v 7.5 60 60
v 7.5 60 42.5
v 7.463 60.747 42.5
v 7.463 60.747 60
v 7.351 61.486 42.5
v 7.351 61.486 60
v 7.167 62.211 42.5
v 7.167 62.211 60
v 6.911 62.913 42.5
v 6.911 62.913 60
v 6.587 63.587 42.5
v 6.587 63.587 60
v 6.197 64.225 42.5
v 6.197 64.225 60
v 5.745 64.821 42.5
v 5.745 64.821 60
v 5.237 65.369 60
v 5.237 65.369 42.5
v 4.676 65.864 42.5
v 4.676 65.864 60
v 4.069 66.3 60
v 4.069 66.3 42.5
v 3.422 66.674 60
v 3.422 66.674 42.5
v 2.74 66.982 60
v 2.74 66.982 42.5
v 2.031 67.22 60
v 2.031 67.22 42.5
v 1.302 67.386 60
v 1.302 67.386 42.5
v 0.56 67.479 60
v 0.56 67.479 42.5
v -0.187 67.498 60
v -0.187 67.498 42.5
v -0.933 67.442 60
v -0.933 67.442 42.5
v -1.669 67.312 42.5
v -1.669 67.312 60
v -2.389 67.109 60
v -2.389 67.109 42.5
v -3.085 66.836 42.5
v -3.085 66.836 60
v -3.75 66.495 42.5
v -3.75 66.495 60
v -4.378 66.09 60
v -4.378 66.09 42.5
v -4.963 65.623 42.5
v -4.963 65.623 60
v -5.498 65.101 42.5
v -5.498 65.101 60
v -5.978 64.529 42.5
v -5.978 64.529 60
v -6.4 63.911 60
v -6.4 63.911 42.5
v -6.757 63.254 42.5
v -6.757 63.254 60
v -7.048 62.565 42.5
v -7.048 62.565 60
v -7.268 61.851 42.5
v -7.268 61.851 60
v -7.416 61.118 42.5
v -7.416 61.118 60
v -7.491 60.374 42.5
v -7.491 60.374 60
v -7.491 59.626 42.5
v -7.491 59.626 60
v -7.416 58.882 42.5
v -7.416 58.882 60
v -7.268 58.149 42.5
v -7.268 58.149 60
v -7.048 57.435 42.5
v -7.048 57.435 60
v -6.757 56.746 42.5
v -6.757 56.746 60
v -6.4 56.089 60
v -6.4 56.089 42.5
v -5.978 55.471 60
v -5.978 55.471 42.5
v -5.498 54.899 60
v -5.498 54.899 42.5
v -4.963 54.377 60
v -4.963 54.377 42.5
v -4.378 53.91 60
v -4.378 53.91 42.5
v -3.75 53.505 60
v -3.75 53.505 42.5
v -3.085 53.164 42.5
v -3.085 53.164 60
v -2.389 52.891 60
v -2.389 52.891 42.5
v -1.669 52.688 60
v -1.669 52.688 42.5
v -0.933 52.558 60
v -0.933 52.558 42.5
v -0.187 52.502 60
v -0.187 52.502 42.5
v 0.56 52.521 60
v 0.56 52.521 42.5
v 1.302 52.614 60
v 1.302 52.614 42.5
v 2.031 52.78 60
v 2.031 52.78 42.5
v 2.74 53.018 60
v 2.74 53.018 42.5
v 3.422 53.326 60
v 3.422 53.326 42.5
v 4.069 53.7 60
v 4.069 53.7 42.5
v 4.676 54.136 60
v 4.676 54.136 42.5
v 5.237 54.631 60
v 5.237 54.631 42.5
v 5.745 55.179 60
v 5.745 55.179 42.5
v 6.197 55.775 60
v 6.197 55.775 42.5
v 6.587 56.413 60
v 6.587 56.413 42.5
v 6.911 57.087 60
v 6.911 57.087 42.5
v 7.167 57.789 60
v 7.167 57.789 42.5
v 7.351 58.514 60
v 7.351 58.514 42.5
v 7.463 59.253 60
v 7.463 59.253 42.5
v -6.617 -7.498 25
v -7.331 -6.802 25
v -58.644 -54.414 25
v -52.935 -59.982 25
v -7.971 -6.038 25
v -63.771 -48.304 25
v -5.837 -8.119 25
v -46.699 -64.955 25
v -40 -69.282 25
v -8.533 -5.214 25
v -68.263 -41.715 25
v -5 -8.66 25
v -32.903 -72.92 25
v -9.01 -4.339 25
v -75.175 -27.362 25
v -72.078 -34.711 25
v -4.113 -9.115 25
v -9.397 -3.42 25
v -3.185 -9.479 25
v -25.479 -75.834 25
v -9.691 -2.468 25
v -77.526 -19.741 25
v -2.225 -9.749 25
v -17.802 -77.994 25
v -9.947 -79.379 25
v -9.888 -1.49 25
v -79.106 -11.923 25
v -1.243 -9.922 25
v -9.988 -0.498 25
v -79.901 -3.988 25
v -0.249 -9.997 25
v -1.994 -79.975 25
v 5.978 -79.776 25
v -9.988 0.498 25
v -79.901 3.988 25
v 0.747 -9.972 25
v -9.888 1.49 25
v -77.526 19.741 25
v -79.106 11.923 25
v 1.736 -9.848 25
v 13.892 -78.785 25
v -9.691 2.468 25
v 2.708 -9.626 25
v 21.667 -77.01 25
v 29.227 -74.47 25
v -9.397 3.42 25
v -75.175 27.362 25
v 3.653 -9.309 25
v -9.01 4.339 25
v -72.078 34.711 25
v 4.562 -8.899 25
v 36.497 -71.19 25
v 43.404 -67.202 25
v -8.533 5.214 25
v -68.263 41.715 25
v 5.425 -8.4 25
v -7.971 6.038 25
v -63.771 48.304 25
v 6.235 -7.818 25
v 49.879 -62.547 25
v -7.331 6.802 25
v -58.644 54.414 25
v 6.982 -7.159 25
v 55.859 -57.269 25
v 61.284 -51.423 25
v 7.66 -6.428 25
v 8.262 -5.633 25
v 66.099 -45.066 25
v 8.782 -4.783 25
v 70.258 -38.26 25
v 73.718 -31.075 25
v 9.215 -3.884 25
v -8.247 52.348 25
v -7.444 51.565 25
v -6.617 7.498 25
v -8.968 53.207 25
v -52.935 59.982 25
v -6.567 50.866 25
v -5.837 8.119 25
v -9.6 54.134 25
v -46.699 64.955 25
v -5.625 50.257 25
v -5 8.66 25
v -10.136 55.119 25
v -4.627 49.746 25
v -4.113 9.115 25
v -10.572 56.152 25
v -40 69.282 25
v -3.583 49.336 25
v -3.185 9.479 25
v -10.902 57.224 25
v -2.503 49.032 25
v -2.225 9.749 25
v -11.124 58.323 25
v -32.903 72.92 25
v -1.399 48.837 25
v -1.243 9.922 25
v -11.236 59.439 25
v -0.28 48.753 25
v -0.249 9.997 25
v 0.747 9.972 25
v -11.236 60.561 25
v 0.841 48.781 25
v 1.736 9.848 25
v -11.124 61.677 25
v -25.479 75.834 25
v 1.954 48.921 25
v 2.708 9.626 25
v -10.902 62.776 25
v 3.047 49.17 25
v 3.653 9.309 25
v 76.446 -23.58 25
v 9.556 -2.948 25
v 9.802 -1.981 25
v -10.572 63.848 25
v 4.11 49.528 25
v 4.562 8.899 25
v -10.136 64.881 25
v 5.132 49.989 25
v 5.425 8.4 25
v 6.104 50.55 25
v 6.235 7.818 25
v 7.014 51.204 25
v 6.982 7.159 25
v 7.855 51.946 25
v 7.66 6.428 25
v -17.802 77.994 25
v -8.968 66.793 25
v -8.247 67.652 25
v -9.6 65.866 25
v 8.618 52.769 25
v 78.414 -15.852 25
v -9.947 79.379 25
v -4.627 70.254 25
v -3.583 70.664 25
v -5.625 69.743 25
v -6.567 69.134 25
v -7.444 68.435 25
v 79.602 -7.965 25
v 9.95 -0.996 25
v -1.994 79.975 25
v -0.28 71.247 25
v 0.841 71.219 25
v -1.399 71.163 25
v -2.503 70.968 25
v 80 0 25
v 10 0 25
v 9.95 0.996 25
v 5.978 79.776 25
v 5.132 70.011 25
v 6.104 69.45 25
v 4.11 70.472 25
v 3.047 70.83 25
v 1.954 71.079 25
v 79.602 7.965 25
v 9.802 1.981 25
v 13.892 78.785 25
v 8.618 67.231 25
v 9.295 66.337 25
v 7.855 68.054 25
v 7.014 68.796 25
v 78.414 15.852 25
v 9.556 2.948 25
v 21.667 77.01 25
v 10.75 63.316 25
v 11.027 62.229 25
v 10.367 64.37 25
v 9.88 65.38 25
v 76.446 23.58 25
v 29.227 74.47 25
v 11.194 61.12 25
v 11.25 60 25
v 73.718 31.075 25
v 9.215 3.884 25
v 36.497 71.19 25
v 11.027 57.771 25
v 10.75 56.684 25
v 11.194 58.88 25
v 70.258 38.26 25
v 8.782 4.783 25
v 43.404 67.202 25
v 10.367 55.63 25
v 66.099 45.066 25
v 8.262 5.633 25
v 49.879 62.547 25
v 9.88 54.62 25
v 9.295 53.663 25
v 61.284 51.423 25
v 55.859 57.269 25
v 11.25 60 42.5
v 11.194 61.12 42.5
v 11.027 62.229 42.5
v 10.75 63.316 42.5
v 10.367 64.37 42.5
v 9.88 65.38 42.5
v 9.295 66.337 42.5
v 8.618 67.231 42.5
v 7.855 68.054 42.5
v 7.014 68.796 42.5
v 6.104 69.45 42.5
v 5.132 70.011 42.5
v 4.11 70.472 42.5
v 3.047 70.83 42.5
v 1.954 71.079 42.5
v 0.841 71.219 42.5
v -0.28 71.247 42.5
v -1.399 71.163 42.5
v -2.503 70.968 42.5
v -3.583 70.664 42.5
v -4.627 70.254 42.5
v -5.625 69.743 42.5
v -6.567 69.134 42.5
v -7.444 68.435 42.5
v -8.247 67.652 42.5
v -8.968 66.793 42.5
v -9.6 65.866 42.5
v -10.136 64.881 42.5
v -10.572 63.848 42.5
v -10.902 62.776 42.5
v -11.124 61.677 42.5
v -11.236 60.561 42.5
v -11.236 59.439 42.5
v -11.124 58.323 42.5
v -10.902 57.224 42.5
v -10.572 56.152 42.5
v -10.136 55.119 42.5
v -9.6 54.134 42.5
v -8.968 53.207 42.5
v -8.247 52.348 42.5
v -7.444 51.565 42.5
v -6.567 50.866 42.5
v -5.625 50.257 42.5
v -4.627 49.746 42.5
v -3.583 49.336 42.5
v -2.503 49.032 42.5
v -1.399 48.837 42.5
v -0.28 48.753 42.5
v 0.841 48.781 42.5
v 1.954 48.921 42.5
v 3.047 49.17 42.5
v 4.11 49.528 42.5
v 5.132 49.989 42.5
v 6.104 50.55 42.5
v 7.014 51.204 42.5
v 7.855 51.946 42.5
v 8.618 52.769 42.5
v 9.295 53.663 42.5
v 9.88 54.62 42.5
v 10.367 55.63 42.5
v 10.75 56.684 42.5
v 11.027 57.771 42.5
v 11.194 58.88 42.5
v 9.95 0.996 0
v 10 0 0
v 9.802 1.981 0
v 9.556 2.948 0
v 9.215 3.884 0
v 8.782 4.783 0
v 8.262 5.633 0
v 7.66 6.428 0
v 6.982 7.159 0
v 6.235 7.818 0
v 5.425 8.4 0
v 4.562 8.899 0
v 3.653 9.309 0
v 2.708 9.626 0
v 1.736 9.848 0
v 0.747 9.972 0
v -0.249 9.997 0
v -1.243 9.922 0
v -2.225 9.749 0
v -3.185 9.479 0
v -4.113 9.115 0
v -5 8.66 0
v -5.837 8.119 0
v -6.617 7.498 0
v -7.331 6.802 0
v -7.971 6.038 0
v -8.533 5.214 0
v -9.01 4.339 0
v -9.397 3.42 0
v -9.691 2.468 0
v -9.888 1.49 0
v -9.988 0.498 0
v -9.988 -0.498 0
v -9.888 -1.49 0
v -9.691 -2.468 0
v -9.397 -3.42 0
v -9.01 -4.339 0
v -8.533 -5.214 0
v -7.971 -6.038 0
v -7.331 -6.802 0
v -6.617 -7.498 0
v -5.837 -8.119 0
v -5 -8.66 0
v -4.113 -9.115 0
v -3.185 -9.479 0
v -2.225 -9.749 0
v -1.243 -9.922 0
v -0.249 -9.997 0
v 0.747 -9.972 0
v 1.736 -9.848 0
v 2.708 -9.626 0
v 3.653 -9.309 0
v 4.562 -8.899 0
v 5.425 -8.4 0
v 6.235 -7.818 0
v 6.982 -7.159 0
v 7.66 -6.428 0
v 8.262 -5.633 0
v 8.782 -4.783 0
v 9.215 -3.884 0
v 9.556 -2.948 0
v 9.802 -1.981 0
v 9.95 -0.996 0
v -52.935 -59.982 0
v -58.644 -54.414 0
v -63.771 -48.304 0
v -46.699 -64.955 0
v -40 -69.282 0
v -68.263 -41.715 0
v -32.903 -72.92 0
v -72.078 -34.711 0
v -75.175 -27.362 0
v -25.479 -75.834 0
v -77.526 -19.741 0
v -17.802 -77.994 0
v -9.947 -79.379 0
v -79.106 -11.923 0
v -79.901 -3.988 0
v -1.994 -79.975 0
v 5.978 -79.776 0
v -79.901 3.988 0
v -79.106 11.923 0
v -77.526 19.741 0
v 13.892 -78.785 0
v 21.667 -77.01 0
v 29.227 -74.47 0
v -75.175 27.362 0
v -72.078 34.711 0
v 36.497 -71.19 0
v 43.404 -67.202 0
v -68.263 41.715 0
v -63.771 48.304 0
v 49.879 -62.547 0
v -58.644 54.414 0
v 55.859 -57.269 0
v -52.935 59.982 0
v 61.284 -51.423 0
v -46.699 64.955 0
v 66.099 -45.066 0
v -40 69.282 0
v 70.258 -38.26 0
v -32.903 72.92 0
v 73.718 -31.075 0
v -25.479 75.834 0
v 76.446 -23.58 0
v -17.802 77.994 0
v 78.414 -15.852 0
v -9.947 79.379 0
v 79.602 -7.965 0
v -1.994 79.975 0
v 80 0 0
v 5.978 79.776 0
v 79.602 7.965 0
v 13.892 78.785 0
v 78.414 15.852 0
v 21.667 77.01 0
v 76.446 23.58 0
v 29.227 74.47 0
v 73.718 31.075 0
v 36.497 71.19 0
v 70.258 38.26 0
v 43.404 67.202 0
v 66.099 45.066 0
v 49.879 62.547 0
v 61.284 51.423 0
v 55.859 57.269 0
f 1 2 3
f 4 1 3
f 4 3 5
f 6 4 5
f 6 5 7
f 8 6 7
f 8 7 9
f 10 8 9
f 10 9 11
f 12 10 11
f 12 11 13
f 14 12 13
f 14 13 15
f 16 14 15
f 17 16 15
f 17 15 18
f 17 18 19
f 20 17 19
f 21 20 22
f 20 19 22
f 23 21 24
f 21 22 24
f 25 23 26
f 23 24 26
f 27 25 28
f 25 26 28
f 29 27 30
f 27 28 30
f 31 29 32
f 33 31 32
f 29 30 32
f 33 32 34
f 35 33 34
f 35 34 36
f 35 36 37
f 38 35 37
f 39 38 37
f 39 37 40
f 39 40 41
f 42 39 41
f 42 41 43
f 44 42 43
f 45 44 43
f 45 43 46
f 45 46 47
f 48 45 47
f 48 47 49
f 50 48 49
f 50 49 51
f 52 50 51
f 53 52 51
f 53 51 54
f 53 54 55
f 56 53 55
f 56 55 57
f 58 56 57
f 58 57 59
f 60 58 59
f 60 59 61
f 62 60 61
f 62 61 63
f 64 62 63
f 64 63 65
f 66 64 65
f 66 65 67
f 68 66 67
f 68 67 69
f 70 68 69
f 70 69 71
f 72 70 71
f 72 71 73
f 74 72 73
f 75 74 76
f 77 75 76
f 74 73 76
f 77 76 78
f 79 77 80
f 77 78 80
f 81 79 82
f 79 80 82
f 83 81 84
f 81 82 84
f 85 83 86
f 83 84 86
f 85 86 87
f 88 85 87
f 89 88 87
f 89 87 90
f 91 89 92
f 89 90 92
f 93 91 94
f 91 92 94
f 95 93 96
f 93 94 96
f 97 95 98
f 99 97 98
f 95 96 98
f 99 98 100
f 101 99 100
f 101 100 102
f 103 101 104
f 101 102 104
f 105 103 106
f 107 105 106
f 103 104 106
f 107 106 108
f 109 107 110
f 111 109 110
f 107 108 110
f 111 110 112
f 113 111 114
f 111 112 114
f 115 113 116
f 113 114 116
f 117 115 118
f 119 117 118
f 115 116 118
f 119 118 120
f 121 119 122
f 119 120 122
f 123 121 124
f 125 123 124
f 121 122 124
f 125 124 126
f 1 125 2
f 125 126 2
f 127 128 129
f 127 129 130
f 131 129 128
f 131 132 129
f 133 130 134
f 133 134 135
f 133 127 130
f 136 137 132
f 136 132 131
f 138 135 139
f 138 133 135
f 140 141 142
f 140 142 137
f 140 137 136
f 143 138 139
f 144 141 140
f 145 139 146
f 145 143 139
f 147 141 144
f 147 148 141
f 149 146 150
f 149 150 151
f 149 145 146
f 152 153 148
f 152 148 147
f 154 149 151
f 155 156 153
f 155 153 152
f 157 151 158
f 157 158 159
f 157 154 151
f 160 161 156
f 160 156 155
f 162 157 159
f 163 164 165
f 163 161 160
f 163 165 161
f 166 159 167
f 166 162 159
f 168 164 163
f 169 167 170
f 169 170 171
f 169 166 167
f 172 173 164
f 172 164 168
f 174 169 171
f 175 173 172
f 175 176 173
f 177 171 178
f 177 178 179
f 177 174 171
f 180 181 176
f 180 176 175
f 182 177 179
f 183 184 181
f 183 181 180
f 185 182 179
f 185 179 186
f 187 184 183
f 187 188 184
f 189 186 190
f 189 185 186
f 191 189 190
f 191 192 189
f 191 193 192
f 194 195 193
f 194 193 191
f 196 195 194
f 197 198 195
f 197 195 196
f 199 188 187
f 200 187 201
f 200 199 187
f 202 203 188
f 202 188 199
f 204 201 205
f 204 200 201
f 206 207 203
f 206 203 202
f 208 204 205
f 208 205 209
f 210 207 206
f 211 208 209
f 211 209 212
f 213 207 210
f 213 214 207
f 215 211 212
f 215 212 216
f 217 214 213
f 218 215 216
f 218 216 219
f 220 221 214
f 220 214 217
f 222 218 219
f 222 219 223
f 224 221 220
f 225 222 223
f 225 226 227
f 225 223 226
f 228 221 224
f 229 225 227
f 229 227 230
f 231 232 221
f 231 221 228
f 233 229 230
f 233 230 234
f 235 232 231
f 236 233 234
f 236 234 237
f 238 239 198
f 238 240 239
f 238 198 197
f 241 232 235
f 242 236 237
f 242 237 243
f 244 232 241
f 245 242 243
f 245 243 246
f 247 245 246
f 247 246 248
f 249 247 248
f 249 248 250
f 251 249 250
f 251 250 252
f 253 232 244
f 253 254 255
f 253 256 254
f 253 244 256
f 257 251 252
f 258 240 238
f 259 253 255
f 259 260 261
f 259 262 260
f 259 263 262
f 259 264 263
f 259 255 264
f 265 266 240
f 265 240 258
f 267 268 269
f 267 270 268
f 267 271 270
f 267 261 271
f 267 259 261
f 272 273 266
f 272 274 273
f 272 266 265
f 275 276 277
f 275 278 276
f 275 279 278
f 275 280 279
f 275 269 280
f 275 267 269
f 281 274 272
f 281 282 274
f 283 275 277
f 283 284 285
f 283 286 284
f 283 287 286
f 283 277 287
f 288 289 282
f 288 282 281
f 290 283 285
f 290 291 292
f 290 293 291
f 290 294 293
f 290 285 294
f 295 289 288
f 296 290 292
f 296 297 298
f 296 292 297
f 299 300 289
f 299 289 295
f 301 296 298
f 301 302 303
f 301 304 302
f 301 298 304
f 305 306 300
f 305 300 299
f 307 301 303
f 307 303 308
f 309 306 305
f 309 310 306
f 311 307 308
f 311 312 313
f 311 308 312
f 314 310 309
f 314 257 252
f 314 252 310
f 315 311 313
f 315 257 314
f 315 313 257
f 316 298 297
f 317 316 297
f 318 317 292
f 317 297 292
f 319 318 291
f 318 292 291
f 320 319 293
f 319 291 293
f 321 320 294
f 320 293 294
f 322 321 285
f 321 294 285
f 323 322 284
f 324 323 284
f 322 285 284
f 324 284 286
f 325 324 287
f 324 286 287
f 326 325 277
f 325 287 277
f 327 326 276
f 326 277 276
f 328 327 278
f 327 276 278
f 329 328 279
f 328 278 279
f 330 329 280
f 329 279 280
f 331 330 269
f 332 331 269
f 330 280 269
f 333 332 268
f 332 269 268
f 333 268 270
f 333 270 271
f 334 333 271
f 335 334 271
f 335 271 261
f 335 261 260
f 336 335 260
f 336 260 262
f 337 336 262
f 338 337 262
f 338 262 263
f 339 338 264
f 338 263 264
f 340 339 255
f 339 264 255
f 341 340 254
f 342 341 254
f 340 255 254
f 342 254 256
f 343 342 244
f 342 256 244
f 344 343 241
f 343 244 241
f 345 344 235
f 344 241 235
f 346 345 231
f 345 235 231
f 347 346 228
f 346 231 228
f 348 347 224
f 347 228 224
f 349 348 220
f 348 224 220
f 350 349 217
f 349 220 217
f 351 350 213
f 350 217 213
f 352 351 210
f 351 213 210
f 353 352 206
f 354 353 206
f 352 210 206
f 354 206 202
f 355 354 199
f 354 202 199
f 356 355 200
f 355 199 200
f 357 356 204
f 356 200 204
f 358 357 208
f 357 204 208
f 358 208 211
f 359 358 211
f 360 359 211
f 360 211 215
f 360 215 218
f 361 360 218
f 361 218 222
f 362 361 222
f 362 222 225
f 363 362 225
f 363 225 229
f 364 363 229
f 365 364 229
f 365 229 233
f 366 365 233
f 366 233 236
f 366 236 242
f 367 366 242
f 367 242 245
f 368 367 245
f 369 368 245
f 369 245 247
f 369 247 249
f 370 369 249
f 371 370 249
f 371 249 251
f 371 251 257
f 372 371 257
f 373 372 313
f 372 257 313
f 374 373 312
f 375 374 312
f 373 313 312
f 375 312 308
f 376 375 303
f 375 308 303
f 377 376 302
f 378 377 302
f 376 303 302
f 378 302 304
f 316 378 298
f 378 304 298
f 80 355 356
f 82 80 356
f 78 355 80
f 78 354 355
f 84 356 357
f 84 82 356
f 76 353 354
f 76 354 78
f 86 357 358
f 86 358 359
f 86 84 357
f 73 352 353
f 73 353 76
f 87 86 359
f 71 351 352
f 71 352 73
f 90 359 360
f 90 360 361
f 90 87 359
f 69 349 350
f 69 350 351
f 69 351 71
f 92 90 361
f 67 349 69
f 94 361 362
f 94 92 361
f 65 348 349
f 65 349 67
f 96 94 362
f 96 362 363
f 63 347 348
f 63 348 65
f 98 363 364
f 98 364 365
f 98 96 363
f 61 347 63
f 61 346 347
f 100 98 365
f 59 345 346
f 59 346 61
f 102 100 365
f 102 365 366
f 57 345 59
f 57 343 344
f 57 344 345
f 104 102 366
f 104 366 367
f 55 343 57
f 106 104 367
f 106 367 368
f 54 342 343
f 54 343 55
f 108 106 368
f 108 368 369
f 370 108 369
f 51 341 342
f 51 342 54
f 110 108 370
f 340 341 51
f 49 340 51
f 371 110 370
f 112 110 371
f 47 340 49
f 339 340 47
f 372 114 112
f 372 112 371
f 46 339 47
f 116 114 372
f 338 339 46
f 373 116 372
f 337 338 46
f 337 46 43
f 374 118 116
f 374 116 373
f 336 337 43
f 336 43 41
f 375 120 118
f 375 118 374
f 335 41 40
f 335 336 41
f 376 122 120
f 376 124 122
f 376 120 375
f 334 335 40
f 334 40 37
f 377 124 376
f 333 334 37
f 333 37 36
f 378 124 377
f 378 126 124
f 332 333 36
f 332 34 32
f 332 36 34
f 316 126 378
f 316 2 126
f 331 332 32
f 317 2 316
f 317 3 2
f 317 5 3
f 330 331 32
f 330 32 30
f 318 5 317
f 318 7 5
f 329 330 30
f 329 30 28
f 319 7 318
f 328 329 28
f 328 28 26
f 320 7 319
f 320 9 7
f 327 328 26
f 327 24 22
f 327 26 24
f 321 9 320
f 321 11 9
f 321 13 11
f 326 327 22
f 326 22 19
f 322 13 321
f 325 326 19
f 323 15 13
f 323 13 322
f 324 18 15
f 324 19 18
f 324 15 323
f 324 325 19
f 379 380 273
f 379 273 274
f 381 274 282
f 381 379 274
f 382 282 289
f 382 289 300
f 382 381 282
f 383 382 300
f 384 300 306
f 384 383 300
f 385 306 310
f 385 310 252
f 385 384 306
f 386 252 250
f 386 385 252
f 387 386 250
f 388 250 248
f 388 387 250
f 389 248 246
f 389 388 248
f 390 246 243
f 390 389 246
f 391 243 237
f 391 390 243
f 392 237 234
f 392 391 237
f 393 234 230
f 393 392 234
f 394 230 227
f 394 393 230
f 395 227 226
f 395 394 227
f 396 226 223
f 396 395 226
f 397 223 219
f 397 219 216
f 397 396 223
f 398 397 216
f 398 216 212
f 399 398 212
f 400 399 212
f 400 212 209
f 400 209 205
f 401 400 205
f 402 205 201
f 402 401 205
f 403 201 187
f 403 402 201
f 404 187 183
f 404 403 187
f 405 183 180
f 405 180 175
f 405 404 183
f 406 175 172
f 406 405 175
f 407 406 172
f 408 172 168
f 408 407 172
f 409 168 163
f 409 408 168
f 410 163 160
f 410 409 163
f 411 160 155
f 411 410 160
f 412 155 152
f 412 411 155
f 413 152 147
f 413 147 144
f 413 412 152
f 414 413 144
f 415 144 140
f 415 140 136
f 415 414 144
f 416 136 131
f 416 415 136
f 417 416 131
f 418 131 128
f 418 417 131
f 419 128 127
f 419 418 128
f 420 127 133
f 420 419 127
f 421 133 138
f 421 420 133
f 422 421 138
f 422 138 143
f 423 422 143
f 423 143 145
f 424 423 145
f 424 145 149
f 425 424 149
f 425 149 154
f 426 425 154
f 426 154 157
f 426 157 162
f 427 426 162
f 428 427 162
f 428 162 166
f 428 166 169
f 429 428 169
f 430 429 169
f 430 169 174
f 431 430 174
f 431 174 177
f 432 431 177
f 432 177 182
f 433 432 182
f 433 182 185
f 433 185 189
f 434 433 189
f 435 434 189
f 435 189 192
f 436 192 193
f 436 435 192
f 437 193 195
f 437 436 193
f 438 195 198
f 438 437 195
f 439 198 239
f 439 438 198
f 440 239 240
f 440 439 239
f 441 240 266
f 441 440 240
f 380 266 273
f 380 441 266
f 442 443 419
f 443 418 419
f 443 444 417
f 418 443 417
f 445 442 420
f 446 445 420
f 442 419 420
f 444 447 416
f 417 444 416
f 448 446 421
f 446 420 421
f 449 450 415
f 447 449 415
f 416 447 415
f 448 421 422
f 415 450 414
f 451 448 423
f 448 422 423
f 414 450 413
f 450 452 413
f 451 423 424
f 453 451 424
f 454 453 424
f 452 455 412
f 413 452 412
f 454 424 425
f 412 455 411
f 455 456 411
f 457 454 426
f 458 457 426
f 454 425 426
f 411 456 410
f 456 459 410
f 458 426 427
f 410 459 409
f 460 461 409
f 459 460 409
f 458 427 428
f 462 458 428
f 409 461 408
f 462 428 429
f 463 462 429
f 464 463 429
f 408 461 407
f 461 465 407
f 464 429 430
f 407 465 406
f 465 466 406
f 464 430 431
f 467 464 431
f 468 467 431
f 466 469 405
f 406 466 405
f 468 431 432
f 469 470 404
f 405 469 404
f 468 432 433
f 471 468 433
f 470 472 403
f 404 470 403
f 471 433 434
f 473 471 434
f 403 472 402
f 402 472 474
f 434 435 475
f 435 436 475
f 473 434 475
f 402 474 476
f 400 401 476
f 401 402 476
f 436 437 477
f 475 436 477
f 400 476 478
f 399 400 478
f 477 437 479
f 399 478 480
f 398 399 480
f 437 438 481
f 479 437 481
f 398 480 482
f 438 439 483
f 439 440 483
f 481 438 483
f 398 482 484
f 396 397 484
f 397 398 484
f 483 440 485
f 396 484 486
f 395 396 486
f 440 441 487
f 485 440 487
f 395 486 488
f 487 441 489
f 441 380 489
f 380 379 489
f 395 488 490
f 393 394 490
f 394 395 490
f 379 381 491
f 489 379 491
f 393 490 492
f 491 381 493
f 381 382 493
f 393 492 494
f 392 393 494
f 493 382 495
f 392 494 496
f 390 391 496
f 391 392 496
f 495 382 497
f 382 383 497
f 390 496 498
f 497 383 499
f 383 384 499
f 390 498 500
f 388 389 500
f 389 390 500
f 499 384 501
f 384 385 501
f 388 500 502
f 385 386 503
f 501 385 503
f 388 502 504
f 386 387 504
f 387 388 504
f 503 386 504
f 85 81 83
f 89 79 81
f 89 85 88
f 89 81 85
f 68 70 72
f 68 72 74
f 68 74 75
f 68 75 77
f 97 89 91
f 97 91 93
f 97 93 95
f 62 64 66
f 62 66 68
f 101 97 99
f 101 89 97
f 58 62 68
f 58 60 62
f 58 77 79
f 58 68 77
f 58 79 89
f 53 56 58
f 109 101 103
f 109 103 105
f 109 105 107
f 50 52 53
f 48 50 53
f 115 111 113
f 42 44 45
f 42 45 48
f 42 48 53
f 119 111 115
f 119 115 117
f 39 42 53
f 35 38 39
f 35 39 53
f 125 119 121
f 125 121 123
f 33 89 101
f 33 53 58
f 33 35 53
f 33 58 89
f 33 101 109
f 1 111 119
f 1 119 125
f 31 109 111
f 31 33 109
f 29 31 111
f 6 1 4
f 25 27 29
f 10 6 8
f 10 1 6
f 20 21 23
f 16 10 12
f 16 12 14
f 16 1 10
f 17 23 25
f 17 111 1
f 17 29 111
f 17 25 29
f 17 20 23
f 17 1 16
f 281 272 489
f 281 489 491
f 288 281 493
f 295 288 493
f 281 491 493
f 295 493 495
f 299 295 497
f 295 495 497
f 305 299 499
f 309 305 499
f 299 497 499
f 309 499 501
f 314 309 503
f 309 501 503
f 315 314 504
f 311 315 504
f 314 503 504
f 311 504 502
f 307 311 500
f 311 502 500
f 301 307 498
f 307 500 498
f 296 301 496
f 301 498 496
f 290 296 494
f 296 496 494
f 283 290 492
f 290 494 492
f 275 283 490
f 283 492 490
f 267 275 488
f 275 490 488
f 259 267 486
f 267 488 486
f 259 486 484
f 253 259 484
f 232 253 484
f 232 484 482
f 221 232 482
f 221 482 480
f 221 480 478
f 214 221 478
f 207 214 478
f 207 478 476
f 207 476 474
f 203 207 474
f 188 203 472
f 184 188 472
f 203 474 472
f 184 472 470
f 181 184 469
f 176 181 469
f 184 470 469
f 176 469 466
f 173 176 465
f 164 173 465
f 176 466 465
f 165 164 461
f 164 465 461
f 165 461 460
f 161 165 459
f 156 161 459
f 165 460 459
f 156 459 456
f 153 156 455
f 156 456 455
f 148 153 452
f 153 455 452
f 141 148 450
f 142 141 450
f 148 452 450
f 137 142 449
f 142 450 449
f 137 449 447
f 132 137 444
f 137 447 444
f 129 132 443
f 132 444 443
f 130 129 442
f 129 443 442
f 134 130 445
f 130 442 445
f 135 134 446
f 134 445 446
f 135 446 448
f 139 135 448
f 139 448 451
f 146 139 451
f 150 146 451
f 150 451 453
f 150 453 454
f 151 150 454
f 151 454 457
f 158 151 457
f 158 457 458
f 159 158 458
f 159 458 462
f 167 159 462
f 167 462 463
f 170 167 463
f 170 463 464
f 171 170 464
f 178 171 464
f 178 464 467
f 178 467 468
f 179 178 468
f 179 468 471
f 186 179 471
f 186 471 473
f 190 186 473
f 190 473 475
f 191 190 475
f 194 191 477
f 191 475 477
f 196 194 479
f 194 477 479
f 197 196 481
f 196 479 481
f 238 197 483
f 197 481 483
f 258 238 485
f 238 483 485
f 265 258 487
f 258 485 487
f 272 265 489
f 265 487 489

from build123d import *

# Parameters (mm, degrees)
F0_R     = 80
F0_R_2   = 10
F1_DEPTH = 25
F2_R     = 7.5
F3_DEPTH = 35
F4_R     = 7.5
F4_R_2   = 11.25
F5_DEPTH = 17.5


with BuildPart() as f1:
    # F0 (on Top) → F1 (new body)
    with BuildSketch(Plane.XY):
        Circle(F0_R)
        Circle(F0_R_2, mode=Mode.SUBTRACT)
    extrude(amount=F1_DEPTH)

    # F2 (on face) → F3 (join)
    with BuildSketch(Plane.XY.offset(25)):
        with Locations((0, 60)):
            Circle(F2_R)
    extrude(amount=F3_DEPTH)

    # F4 (on face) → F5 (join)
    with BuildSketch(Plane.XY.offset(25)):
        with Locations((0, 60)):
            Circle(F4_R)
        with Locations((0, 60)):
            Circle(F4_R_2)
        with Locations((0, 60)):
            Circle(F4_R, mode=Mode.SUBTRACT)
    extrude(amount=F5_DEPTH)


solid = f1.part
